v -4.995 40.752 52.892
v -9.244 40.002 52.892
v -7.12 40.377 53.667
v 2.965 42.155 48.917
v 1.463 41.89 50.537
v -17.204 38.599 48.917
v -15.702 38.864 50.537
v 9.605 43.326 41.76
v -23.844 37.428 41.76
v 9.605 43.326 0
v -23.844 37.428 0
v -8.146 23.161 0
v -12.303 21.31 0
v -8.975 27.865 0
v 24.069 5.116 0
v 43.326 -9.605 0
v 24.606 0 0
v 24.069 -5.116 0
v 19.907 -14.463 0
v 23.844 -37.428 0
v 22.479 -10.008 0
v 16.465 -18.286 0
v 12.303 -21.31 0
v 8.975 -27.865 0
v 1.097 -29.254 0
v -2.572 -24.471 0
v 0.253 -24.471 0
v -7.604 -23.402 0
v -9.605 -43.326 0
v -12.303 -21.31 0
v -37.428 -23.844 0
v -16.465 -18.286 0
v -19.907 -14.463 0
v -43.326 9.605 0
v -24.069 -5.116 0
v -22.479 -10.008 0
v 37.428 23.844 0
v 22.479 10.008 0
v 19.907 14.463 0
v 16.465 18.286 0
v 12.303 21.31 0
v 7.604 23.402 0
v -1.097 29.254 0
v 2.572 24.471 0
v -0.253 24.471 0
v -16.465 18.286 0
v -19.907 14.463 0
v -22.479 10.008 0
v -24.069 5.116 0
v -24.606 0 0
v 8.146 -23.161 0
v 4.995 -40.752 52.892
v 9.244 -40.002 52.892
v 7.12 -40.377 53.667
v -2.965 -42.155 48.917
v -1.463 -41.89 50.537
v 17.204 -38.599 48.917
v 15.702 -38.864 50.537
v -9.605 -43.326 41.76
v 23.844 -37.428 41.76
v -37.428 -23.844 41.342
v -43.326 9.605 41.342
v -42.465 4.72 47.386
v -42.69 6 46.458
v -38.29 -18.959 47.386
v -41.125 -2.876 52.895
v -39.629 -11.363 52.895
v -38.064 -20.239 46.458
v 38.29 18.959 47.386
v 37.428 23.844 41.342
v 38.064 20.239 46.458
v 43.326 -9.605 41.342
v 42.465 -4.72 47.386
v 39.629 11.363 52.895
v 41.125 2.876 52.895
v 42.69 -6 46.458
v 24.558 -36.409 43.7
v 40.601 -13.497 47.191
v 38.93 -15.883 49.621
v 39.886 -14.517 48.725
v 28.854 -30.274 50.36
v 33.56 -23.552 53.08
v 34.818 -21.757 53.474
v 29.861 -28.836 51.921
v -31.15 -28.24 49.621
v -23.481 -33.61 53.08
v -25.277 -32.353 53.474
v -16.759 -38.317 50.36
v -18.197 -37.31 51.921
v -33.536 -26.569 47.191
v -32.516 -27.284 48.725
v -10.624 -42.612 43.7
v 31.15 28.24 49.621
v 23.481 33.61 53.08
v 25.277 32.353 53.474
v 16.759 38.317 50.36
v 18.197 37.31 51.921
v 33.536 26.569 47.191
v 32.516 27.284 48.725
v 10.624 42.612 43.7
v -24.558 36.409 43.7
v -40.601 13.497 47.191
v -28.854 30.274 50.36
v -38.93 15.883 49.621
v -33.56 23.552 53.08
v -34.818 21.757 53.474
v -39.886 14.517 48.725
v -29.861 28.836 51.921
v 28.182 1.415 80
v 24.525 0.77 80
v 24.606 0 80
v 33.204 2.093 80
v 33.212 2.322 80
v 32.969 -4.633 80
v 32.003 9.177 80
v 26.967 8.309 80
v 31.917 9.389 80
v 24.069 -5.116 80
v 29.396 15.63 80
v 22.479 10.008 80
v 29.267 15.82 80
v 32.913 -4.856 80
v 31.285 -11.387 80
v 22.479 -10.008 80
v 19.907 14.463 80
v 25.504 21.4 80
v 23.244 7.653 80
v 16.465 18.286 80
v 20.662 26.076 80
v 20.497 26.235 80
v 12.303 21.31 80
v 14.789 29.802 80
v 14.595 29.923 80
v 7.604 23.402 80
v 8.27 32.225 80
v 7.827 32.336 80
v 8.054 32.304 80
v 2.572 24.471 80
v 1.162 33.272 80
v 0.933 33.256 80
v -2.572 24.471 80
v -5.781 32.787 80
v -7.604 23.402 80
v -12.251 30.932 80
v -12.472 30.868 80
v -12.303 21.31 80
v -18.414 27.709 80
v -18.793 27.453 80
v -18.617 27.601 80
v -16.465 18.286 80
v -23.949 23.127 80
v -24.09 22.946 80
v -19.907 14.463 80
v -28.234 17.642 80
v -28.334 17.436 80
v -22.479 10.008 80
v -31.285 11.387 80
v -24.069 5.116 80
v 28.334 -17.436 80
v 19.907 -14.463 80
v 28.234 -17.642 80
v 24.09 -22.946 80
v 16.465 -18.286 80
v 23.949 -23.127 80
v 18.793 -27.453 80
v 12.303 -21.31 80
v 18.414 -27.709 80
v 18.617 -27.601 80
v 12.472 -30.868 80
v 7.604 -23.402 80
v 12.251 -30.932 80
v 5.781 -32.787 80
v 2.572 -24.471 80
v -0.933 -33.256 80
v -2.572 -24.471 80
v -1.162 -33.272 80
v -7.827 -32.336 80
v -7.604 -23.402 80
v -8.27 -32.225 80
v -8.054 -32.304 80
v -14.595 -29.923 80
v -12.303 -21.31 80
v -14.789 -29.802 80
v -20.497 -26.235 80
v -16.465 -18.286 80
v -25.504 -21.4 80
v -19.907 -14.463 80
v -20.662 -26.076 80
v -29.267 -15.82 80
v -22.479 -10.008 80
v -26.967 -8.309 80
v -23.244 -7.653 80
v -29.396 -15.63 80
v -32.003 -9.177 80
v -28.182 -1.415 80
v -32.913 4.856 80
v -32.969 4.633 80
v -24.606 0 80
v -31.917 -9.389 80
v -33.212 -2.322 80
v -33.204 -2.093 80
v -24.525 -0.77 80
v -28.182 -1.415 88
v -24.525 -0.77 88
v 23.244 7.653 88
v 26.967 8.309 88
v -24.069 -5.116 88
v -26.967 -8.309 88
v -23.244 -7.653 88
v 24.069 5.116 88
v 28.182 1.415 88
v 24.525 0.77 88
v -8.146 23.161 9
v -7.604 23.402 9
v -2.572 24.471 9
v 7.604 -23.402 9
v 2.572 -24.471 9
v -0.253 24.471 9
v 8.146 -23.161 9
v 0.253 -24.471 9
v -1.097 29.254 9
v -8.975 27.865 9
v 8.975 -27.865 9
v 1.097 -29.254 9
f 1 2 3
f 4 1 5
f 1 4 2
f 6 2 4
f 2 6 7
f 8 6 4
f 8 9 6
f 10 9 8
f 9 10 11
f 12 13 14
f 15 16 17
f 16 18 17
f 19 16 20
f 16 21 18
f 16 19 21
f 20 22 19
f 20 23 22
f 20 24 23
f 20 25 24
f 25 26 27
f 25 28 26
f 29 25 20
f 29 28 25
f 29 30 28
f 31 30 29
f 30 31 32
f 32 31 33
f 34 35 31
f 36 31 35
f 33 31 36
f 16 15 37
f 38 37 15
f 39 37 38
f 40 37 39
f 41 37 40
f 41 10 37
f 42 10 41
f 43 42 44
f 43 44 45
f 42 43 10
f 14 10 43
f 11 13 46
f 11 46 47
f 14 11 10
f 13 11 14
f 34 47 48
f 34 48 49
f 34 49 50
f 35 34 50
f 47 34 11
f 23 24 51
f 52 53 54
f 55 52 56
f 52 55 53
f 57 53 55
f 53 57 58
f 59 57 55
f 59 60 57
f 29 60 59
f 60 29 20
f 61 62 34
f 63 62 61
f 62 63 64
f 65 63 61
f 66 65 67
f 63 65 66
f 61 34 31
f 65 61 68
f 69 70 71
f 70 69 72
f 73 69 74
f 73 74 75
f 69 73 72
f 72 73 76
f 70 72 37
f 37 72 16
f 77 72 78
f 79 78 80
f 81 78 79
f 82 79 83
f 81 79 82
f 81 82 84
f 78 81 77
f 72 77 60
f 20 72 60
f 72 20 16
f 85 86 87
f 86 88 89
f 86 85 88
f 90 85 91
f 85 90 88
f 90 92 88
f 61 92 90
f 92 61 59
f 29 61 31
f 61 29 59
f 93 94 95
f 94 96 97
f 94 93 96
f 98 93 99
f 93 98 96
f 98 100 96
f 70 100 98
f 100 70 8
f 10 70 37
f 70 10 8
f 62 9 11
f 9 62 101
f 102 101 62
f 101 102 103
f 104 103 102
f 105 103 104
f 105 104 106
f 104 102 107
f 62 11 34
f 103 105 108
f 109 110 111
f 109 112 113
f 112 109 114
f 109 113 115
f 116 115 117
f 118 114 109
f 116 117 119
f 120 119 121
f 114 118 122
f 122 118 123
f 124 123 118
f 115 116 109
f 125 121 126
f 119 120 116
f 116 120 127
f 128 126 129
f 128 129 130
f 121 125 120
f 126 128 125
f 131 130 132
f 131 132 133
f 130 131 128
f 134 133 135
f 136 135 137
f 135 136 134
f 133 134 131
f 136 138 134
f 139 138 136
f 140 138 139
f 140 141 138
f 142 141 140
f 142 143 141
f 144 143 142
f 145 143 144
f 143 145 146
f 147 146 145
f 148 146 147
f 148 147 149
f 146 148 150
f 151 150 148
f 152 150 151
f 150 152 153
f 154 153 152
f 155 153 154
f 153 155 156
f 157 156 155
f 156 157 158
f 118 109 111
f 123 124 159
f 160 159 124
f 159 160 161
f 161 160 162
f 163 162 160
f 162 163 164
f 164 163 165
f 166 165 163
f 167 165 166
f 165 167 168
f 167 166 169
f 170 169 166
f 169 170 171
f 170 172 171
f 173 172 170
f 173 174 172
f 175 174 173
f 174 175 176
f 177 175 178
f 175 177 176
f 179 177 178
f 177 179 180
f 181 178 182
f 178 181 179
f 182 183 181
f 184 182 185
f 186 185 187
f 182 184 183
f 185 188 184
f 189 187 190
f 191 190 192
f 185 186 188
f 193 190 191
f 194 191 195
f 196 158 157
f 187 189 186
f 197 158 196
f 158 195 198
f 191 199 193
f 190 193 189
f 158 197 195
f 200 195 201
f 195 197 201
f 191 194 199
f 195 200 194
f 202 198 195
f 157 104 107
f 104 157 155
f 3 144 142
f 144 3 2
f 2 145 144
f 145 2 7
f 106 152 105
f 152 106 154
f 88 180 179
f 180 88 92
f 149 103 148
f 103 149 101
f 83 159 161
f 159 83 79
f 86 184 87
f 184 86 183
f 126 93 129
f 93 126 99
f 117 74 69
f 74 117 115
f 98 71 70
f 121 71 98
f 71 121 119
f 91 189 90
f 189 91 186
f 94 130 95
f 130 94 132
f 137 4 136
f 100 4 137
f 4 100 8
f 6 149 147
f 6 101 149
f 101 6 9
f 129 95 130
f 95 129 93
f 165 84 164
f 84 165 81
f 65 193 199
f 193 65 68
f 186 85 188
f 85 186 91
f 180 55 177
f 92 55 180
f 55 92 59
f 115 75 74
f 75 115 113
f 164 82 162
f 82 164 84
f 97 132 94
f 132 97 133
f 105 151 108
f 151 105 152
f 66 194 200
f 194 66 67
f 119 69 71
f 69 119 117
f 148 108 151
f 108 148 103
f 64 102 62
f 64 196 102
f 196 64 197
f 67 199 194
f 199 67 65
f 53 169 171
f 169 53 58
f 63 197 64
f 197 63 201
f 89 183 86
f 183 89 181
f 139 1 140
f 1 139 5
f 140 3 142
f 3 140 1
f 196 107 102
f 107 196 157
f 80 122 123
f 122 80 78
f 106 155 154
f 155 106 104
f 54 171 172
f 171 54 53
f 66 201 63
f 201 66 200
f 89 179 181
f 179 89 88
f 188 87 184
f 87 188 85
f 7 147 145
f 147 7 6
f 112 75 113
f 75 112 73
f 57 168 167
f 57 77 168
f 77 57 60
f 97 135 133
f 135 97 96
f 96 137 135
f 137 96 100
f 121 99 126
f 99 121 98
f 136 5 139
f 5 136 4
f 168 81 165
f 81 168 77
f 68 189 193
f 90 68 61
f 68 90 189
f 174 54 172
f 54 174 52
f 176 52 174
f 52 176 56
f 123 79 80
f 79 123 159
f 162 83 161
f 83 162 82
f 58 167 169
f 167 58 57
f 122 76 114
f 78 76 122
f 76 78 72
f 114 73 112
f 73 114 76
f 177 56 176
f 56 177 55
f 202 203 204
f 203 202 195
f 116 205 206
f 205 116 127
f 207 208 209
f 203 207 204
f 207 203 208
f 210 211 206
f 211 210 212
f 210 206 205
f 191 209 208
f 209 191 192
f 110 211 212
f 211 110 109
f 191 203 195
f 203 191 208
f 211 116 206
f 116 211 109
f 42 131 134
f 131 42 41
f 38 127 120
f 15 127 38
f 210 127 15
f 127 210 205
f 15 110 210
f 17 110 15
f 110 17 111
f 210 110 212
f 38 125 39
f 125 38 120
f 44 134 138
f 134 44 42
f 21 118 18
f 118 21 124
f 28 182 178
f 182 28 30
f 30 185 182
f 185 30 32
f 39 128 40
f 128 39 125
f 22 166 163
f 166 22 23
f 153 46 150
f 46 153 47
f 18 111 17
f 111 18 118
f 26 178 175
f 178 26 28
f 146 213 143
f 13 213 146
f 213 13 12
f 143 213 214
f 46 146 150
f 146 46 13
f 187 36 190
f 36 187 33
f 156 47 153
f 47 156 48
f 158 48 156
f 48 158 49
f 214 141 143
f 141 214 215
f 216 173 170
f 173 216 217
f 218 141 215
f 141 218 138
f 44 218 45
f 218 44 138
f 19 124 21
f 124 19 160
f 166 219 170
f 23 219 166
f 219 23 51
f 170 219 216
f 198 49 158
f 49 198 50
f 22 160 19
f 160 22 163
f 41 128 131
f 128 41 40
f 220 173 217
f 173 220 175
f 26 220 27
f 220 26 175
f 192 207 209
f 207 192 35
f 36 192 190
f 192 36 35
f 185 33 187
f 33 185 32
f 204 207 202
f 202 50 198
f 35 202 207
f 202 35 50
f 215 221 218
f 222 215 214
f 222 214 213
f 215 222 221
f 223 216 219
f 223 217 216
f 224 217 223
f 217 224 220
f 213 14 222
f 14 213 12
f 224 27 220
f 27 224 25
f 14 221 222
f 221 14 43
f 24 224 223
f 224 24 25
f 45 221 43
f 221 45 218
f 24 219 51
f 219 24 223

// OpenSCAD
// file: shapes.scad
/*
 *  OpenSCAD Shapes Library (www.openscad.at)
 *  Copyright (C) 2009  Catarina Mota <clifford@clifford.at>
 *
 *  This program is free software; you can redistribute it and/or modify
 *  it under the terms of the GNU General Public License as published by
 *  the Free Software Foundation; either version 2 of the License, or
 *  (at your option) any later version.
 *
 *  This program is distributed in the hope that it will be useful,
 *  but WITHOUT ANY WARRANTY; without even the implied warranty of
 *  MERCHANTABILITY or FITNESS FOR A PARTICULAR PURPOSE.  See the
 *  GNU General Public License for more details.
 *
 *  You should have received a copy of the GNU General Public License
 *  along with this program; if not, write to the Free Software
 *  Foundation, Inc., 59 Temple Place, Suite 330, Boston, MA  02111-1307  USA
 *
*/


//box(width, height, depth);
//roundedBox(width, height, depth, factor);
//cone(height, radius);
//oval(width, height, depth);
//tube(height, radius, wall);
//ovalTube(width, height, depth, wall);
//hexagon(height, depth);
//octagon(height, depth);
//dodecagon(height, depth);
//hexagram(height, depth);
//rightTriangle(adjacent, opposite, depth);
//equiTriangle(side, depth);
//12ptStar(height, depth);

//----------------------

//roundedBox(120, 60, 3, 8);

//----------------------

module box(w,h,d) {
	scale ([w,h,d]) cube(1, true);
}

module roundedBox(w,h,d,f){
	difference(){
		box(w,h,d);
		translate([-w/2,h/2,0]) cube(w/(f/2),true);
		translate([w/2,h/2,0]) cube(w/(f/2),true);
		translate([-w/2,-h/2,0]) cube(w/(f/2),true);
		translate([w/2,-h/2,0]) cube(w/(f/2),true);
	}
	translate([-w/2+w/f,h/2-w/f,-d/2]) cylinder(d,w/f, w/f);
	translate([w/2-w/f,h/2-w/f,-d/2]) cylinder(d,w/f, w/f);
	translate([-w/2+w/f,-h/2+w/f,-d/2]) cylinder(d,w/f, w/f);
	translate([w/2-w/f,-h/2+w/f,-d/2]) cylinder(d,w/f, w/f);
}

module cone(height, radius) {
		cylinder(height, radius, 0);
}

module oval(w,h,d) {
	scale ([w/100, h/100, 1]) cylinder(d, 50, 50);
}

module tube(height, radius, wall) {
	difference(){
		cylinder(height, radius, radius);
		cylinder(height, radius-wall, radius-wall);
	}
}

module ovalTube(w,h,d,wall) {
	difference(){
		scale ([w/100, h/100, 1]) cylinder(d, 50, 50);
		scale ([w/100, h/100, 1]) cylinder(d, 50-wall, 50-wall);
	}
}

module hexagon(height, depth) {
	boxWidth=height/1.75;
		union(){
			box(boxWidth, height, depth);
			rotate([0,0,60]) box(boxWidth, height, depth);
			rotate([0,0,-60]) box(boxWidth, height, depth);
		}
}

module octagon(height, depth) {
	intersection(){
		box(height, height, depth);
		rotate([0,0,45]) box(height, height, depth);
	}
}

module dodecagon(height, depth) {
	intersection(){
		hexagon(height, depth);
		rotate([0,0,90]) hexagon(height, depth);
	}
}

module hexagram(height, depth) {
	boxWidth=height/1.75;
	intersection(){
		box(height, boxWidth, depth);
		rotate([0,0,60]) box(height, boxWidth, depth);
	}
	intersection(){
		box(height, boxWidth, depth);
		rotate([0,0,-60]) box(height, boxWidth, depth);
	}
	intersection(){
		rotate([0,0,60]) box(height, boxWidth, depth);
		rotate([0,0,-60]) box(height, boxWidth, depth);
	}
}

module rightTriangle(adjacent, opposite, depth) {
	difference(){
		translate([-adjacent/2,opposite/2,0]) box(adjacent, opposite, depth);
		translate([-adjacent,0,0]){
			rotate([0,0,atan(opposite/adjacent)]) dislocateBox(adjacent*4, opposite, depth);
		}
	}
}

module equiTriangle(side, depth) {
	difference(){
		translate([-side/2,side/2,0]) box(side, side, depth);
		rotate([0,0,30]) dislocateBox(side*2, side, depth);
		translate([-side,0,0]){
			rotate([0,0,60]) dislocateBox(side*2, side, depth);
		}
	}
}

module 12ptStar(height, depth) {
	starNum=3;
	starAngle=360/starNum;
	for (s=[1:starNum]){
		rotate([0, 0, s*starAngle]) box(height, height, depth);
	}
}

//-----------------------
//MOVES THE ROTATION AXIS OF A BOX FROM ITS CENTER TO THE BOTTOM LEFT CORNER
module dislocateBox(w,h,d){
	translate([w/2,h,0]){
		difference(){
			box(w, h*2, d+1);
			translate([-w,0,0]) box(w, h*2, d+1);
		}
	}
}
// main file
include <shapes.scad>  // using Catarina Mota's shapes library

boxheight = 80;
boxwidth = 82;
insideradius = ((((15/16)+1) * 25.4) / 2);
connectorheight = 8; 
connectorwidth = 7;
smaller = 8; 
difference ()
{
	rotate ([0,0,100]) union ()
		{
		translate ([0,0,boxheight/2]) intersection ()
			{
			cylinder (h=boxwidth/2, r1 = (boxwidth/2)+(smaller/2), r2 = (boxwidth/2)-smaller);
			translate ([0,0,boxheight/4]) octagon (boxwidth, boxheight/2);
			}
		translate ([0,0,boxheight/4]) octagon (boxwidth, boxheight/2);
		translate ([-connectorwidth/2,-(boxwidth-(smaller*3+2))/2,boxheight]) cube ([connectorwidth, boxwidth-(smaller*3+2), connectorheight]); 
		}
	translate ([0,0,0]) cylinder (h=(boxheight+connectorheight), r = insideradius, $fn=30);
	rotate ([0,0,10]) translate ([-(connectorwidth+1)/2,-(boxwidth-(smaller*3))/2,0]) cube ([connectorwidth+1, boxwidth-(3*smaller), connectorheight+1]); 
}

/* Old ideas go here
pegwidth = 8;
pegheight = 7;
ridgeheight = 2.5;
ridgedepth = 3.5;
pegoffset = ((boxwidth/2)-16);
holeoffset = ((boxwidth/2)-18);
		translate ([-boxwidth/2,-boxwidth/2,0]) cube ([boxwidth, boxwidth, boxheight]);
	for (spacing2 = [0:10])
		{
		for (spacing = [0:10]) 
			{
			translate ([-37.5+(spacing*7),-32.5+(spacing2*7),-0.001]) rotate ([90,,0]) cube(5, 5, boxwidth-6);
			}
		}
	//to make all the squares open on the inside.  Should prevent random block filling
	translate ([23,2.5,-0.001]) rotate ([90,,0]) cube(5, 5, boxwidth-6);
	translate ([23,-4.5,-0.001]) rotate ([90,,0]) cube(5, 5, boxwidth-6);
	translate ([23,9.5,-0.001]) rotate ([90,,0]) cube(5, 5, boxwidth-6);
	//translate ([25.5,33.5,-0.001]) rotate ([90,,0]) cube(5, 5, boxwidth-6);
	translate ([4.5,26.5,-0.001]) rotate ([90,,0]) cube(5, 5, boxwidth-6);
	translate ([-2.5,26.5,-0.001]) rotate ([90,,0]) cube(5, 5, boxwidth-6);
	translate ([-9.5,26.5,-0.001]) rotate ([90,,0]) cube(5, 5, boxwidth-6);
	translate ([-27.5,9.5,-0.001]) rotate ([90,,0]) cube(5, 5, boxwidth-6);
	translate ([-27.5,2.5,-0.001]) rotate ([90,,0]) cube(5, 5, boxwidth-6);
	translate ([-27.5,-4.5,-0.001]) rotate ([90,,0]) cube(5, 5, boxwidth-6);
	translate ([-9.5,-22.5,-0.001]) rotate ([90,,0]) cube(5, 5, boxwidth-6);
	translate ([-2.5,-22.5,-0.001]) rotate ([90,,0]) cube(5, 5, boxwidth-6);
	translate ([4.5,-22.5,-0.001]) rotate ([90,,0]) cube(5, 5, boxwidth-6);


		for (spacing = [0:7]) 
			{
			translate ([-35+(spacing*10),0,boxheight+ridgeheight]) rotate ([90,225,0]) rightTriangle(5, 5, boxwidth-6);
			}
	for (spacing = [0:8]) 
		{
		translate ([-35+(spacing*8.7),0,ridgedepth]) rotate ([90,225,0]) rightTriangle(5, 5, boxwidth-4);
		}
*/
